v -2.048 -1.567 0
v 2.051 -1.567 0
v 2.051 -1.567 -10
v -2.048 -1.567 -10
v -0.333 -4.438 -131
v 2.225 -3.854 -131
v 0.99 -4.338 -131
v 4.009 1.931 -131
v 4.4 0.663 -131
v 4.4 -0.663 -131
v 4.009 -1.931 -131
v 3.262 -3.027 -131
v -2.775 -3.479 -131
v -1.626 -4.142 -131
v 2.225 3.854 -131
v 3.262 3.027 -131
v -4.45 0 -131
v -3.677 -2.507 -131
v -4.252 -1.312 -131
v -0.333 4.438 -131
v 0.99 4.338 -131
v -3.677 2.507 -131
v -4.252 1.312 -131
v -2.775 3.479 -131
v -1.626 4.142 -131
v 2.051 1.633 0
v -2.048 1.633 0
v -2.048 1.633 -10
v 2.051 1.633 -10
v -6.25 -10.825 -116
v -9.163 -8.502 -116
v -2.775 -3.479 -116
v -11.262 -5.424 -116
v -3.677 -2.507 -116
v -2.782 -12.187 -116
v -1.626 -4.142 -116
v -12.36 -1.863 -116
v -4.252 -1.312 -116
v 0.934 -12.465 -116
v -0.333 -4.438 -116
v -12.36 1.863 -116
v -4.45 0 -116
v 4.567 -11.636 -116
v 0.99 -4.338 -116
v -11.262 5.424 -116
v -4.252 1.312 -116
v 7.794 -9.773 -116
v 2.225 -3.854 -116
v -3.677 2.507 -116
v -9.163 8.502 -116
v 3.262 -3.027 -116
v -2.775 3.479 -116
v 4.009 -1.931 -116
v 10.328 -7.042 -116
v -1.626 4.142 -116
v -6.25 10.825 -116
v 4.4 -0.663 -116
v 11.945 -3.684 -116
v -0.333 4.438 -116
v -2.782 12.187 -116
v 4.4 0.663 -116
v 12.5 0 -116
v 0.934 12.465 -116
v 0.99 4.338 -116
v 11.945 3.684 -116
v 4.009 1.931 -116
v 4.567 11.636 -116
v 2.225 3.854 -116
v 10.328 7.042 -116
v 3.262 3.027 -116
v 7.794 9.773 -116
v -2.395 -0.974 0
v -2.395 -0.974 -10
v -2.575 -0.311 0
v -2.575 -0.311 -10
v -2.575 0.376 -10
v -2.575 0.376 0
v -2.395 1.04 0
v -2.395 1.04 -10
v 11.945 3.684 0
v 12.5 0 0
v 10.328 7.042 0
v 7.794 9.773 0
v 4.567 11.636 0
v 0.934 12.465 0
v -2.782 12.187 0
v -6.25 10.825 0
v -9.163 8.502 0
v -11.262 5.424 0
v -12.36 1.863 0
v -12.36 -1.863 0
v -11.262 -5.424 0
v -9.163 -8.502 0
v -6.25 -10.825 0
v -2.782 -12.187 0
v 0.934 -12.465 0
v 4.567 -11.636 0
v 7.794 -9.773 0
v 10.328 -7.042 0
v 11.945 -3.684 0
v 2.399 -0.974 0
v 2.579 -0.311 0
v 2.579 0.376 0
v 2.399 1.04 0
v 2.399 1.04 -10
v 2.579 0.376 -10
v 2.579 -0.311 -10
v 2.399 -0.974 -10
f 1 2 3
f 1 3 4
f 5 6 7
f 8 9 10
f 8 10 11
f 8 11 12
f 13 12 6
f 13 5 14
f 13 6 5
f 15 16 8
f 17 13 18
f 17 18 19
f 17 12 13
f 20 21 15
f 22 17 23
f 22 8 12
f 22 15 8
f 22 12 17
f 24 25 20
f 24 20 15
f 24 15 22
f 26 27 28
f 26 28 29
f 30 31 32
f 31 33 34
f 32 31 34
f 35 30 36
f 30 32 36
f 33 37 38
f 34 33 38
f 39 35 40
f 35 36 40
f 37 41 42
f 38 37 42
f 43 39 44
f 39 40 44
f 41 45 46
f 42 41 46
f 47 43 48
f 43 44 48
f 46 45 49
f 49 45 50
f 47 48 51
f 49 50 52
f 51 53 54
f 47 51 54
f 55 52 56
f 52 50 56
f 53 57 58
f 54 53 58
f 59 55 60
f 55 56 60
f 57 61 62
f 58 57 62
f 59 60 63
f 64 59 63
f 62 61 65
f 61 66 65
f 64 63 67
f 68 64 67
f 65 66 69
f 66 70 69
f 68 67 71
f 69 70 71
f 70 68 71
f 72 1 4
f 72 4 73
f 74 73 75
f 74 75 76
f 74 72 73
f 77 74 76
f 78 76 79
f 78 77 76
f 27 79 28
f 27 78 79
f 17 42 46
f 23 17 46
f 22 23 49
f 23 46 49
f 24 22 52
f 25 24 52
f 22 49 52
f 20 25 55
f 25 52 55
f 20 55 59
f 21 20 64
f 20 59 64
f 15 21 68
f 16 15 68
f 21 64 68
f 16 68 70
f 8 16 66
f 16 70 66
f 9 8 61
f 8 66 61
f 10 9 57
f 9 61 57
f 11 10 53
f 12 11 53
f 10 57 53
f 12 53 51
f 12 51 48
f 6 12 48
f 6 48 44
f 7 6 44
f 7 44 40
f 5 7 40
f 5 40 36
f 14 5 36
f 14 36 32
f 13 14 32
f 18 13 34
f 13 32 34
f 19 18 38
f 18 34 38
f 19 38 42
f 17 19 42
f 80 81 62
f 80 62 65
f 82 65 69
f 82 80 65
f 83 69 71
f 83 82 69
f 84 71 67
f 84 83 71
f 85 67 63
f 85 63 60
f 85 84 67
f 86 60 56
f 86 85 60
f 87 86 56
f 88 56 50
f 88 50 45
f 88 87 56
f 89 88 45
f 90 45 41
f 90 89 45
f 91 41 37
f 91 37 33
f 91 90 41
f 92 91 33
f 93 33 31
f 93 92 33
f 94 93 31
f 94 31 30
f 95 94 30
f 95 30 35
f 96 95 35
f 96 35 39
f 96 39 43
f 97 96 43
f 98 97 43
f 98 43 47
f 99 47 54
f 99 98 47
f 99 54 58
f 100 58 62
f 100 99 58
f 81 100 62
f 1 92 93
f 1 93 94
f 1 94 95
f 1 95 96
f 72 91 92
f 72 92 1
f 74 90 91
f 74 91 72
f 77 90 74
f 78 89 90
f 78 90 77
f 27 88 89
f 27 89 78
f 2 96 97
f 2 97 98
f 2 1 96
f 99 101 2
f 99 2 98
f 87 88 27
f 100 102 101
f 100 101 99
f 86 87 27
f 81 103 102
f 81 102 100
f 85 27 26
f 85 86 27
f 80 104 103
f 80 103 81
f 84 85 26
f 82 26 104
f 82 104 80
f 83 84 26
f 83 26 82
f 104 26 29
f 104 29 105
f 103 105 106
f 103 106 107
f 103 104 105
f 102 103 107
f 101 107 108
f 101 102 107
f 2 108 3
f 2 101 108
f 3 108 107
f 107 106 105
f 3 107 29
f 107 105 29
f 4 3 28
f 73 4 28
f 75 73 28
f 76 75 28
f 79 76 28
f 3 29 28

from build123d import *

# Parameters (mm, degrees)
SKETCH2_R           = 12.5
BOSS_EXTRUDE1_DEPTH = 116
SKETCH3_R           = 4.45
BOSS_EXTRUDE2_DEPTH = 15
CUT_EXTRUDE1_DEPTH  = 10


with BuildPart() as part:
    # Sketch2 → Boss-Extrude1 (new body)
    with BuildSketch(Plane.XY):
        Circle(SKETCH2_R)
    extrude(amount=-BOSS_EXTRUDE1_DEPTH)

    # Sketch3 → Boss-Extrude2 (add)
    with BuildSketch(Plane(origin=(0, 0, -116), x_dir=(-1, 0, 0), z_dir=(0, 0, -1))):
        Circle(SKETCH3_R)
    extrude(amount=BOSS_EXTRUDE2_DEPTH)

    # Sketch1 → Cut-Extrude1 (cut)
    with BuildSketch(Plane.XY):
        with BuildLine():
            Line((2.051104302, -1.567413373), (-2.047676004, -1.567413373))
            ThreePointArc((-2.047676004, -1.567413373), (-2.598285851, 0.032586627), (-2.047676004, 1.632586627))
            Line((-2.047676004, 1.632586627), (2.051104302, 1.632586627))
            ThreePointArc((2.051104302, 1.632586627), (2.601714149, 0.032586627), (2.051104302, -1.567413373))
        make_face()
    extrude(amount=-CUT_EXTRUDE1_DEPTH, mode=Mode.SUBTRACT)


solid = part.part
